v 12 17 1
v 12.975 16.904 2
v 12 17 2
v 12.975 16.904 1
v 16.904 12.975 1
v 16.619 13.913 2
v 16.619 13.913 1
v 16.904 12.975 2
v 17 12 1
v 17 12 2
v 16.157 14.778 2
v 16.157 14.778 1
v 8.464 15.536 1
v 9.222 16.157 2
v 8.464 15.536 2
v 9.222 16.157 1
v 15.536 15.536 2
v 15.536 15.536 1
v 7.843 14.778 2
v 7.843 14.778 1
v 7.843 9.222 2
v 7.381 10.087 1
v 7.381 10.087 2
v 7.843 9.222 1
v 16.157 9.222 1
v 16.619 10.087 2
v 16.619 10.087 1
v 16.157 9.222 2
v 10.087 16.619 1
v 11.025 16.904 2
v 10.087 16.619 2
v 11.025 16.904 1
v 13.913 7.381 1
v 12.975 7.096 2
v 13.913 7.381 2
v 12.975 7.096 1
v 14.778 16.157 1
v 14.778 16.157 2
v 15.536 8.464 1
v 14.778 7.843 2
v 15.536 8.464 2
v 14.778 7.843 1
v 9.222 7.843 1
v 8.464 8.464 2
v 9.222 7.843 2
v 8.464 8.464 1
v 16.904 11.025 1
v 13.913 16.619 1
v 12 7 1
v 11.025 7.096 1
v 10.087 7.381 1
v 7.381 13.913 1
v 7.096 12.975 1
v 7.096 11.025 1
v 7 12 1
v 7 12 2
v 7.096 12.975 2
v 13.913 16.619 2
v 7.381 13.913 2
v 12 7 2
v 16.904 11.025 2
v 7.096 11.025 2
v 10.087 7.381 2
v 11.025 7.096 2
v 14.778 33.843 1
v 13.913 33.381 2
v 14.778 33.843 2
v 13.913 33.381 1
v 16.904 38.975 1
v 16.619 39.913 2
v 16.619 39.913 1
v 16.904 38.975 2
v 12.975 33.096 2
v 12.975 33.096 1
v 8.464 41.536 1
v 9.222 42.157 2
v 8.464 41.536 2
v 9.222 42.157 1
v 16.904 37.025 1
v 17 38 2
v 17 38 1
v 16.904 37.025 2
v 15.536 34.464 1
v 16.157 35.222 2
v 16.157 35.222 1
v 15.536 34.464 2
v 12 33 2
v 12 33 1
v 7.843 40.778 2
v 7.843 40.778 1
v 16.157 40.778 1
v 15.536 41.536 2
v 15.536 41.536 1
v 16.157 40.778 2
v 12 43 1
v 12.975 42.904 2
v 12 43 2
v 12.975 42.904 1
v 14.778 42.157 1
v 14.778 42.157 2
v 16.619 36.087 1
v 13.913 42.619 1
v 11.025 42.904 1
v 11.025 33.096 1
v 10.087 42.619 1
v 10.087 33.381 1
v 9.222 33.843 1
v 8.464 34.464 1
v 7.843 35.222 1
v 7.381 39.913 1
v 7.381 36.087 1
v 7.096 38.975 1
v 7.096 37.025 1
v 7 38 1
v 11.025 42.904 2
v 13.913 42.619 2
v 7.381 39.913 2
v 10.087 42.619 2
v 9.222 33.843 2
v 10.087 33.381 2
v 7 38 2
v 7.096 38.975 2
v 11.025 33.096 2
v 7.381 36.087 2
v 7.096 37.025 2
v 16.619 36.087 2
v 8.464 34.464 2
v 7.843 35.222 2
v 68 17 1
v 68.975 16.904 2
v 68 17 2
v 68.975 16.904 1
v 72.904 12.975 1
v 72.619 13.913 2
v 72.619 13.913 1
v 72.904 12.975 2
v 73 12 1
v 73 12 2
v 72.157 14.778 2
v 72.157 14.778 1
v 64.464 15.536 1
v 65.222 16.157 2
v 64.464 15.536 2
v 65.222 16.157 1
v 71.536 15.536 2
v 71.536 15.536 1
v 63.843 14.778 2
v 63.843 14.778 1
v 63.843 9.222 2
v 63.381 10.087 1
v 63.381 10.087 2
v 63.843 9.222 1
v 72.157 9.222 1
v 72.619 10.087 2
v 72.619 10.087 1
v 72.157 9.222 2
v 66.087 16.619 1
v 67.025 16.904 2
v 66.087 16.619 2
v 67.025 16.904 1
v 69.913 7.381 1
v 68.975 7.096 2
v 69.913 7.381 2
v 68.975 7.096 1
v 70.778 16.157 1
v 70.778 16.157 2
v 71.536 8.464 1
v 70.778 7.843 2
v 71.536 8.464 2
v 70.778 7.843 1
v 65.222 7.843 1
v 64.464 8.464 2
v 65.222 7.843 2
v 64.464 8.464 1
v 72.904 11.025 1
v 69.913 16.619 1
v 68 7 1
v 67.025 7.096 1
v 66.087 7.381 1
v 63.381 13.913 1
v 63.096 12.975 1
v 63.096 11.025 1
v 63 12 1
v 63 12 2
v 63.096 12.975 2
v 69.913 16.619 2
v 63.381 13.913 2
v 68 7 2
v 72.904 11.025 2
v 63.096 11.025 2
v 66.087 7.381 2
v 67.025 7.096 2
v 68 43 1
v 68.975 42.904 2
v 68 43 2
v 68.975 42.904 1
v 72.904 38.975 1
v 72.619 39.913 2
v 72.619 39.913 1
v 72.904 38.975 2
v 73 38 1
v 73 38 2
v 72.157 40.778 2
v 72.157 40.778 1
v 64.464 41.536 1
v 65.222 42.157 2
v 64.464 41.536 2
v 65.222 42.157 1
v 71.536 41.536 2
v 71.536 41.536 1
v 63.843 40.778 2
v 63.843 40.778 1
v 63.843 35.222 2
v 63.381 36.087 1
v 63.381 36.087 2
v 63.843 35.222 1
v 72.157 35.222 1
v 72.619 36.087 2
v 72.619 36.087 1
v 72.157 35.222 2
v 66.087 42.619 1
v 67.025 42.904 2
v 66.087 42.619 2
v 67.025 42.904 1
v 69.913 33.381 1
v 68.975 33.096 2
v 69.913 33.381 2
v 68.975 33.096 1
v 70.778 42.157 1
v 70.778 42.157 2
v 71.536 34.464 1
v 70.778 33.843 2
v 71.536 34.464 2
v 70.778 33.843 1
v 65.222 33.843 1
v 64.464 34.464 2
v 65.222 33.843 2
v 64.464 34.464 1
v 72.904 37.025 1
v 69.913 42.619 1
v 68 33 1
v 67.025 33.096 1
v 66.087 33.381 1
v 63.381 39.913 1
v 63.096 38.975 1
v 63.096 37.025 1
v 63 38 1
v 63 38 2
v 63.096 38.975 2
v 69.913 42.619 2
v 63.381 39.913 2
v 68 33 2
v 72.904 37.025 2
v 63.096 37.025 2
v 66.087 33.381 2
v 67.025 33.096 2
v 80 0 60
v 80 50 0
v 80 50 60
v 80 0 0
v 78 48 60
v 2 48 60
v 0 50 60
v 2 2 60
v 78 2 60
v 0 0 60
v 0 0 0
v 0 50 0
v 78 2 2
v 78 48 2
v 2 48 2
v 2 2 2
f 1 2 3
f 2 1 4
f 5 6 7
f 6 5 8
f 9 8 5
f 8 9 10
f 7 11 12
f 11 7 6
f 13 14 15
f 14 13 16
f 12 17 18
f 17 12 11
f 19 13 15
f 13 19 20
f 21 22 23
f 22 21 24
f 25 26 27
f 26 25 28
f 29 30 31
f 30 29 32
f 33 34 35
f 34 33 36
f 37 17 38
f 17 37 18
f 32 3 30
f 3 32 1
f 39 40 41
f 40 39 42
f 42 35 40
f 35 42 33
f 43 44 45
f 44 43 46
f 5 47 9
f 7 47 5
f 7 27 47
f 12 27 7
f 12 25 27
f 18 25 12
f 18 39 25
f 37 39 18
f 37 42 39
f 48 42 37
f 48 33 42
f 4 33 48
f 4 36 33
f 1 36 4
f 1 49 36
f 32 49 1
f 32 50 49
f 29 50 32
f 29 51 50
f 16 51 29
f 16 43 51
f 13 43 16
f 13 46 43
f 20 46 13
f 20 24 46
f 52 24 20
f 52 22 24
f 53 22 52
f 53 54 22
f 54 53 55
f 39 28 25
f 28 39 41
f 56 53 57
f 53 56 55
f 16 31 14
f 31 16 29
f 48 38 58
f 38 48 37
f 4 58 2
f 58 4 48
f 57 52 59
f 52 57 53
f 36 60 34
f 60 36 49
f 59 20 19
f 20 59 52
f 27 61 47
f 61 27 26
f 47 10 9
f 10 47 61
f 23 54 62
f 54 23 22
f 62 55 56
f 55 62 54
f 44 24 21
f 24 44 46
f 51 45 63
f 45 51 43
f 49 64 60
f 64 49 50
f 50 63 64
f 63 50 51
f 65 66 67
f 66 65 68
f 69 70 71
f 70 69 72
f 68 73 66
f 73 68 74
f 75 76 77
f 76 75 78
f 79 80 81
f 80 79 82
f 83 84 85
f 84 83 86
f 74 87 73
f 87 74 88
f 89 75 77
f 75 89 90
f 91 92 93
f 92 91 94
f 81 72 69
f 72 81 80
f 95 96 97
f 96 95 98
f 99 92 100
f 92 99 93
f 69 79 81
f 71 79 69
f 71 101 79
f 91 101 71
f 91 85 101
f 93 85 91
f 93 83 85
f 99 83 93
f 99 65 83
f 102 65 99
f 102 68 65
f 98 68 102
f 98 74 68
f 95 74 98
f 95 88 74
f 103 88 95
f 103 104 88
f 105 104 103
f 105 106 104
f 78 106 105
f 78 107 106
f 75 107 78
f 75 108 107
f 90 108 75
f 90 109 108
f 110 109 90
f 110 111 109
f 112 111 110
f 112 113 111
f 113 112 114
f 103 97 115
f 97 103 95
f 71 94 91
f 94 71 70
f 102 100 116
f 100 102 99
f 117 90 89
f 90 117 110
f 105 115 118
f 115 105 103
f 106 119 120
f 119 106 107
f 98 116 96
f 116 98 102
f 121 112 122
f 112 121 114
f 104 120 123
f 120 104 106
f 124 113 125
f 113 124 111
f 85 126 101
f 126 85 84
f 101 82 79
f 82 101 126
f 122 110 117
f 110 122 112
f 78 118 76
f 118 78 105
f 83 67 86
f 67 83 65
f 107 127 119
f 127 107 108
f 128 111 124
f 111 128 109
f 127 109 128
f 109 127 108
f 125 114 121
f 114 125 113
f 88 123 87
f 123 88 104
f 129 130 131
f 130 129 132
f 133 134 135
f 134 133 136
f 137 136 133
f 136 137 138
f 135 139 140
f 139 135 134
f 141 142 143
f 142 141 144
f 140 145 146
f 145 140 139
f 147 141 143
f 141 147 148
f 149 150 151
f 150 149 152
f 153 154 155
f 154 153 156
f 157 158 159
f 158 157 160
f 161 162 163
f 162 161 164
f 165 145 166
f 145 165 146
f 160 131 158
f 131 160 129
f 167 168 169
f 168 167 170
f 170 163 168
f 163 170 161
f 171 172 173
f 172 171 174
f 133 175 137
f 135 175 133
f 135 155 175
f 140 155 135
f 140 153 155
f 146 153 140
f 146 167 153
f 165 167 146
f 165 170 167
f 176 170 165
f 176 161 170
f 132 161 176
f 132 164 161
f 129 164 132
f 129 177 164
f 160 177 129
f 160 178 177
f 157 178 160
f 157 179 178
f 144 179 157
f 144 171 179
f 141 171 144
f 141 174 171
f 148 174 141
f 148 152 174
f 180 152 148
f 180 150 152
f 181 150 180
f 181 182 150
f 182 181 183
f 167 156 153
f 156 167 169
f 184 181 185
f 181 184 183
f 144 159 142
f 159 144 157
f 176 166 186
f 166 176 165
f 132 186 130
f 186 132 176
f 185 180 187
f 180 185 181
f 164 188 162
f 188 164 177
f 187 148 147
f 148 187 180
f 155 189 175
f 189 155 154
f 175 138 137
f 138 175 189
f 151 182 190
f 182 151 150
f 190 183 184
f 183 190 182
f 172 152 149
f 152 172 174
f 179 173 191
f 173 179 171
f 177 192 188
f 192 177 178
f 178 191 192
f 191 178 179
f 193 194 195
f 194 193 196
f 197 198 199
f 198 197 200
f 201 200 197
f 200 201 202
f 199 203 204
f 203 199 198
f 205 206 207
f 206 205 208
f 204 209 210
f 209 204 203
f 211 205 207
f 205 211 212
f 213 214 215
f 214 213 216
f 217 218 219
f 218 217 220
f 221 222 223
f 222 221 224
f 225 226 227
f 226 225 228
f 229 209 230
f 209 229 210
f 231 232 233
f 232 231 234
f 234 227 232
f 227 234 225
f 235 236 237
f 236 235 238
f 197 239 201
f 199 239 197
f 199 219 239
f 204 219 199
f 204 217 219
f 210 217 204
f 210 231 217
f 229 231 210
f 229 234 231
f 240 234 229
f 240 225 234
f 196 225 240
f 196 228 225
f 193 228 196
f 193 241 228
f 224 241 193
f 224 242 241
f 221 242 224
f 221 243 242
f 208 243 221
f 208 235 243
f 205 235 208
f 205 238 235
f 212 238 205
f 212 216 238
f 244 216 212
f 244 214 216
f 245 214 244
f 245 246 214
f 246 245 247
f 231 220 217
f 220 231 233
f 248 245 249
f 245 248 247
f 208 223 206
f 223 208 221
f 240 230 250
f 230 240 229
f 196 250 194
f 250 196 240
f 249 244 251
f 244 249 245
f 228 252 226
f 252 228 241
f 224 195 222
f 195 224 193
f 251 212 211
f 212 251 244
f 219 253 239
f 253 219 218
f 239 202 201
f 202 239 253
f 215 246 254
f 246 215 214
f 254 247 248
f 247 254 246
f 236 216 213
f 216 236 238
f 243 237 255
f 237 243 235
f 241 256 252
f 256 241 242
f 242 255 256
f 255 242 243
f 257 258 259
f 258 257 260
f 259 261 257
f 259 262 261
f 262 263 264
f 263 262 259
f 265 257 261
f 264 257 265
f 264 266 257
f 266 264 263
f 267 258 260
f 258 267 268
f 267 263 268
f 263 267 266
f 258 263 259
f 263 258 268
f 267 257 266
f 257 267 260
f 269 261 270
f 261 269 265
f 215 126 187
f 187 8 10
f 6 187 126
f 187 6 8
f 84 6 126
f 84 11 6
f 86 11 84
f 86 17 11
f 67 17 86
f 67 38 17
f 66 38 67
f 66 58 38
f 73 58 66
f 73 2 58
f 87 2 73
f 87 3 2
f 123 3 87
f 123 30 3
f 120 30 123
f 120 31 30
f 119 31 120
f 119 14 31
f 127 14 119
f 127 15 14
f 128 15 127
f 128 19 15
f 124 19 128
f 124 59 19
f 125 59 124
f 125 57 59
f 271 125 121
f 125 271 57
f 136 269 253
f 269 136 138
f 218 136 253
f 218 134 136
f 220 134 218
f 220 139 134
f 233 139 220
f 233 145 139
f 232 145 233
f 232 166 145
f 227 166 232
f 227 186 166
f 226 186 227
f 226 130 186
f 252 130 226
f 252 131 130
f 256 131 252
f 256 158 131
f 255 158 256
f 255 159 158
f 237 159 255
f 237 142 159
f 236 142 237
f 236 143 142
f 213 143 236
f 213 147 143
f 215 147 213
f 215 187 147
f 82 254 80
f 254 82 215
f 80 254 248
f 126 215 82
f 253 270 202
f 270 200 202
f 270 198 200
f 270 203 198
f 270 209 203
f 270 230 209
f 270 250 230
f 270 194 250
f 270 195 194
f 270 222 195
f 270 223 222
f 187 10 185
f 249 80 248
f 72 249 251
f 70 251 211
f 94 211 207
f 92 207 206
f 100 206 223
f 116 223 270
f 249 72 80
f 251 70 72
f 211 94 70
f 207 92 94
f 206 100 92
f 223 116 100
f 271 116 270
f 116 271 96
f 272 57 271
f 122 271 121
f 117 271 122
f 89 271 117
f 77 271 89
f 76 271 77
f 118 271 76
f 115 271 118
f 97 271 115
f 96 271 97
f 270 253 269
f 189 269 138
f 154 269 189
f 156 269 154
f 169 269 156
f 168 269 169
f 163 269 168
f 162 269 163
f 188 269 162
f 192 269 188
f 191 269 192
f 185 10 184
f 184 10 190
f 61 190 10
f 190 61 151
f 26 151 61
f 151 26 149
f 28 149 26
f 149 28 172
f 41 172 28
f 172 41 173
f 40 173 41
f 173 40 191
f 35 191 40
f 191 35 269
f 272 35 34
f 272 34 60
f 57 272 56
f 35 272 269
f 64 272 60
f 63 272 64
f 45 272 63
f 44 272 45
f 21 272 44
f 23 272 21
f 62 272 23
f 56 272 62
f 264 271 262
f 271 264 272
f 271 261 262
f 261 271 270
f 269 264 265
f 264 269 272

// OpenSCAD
$fn = 32;

// ----------------------------------------------------------------------
// Enclosure box: bosses enclosure
// ----------------------------------------------------------------------

// --- parameters (mm) ---
box_l = 80;               // outer length, X
box_w = 50;               // outer width, Y
box_h = 60;               // outer height
wall_t = 2;               // wall thickness
boss_r = 5;               // corner boss radius
hole_r = 1.5;             // boss screw hole radius
boss_in = 12;             // boss inset from the corners
fit_tol = 0.02;           // tolerance for press fits, mm
free_tol = 0.2;           // tolerance for clearance fits, mm

inner_h = box_h - wall_t;  // cavity depth
boss_h = inner_h - 2;  // corner boss height

difference() {
  cube([box_l, box_w, box_h]);
  translate([wall_t, wall_t, wall_t])
    cube([box_l - 2 * wall_t, box_w - 2 * wall_t, box_h]);
  for (sx = [0, 1], sy = [0, 1])
    translate([sx ? box_l - boss_in : boss_in,
               sy ? box_w - boss_in : boss_in, wall_t - 1]) {
      cylinder(r = boss_r, h = boss_h);
      translate([0, 0, boss_h - 4])
        cylinder(r = hole_r, h = 5);
    }
}
